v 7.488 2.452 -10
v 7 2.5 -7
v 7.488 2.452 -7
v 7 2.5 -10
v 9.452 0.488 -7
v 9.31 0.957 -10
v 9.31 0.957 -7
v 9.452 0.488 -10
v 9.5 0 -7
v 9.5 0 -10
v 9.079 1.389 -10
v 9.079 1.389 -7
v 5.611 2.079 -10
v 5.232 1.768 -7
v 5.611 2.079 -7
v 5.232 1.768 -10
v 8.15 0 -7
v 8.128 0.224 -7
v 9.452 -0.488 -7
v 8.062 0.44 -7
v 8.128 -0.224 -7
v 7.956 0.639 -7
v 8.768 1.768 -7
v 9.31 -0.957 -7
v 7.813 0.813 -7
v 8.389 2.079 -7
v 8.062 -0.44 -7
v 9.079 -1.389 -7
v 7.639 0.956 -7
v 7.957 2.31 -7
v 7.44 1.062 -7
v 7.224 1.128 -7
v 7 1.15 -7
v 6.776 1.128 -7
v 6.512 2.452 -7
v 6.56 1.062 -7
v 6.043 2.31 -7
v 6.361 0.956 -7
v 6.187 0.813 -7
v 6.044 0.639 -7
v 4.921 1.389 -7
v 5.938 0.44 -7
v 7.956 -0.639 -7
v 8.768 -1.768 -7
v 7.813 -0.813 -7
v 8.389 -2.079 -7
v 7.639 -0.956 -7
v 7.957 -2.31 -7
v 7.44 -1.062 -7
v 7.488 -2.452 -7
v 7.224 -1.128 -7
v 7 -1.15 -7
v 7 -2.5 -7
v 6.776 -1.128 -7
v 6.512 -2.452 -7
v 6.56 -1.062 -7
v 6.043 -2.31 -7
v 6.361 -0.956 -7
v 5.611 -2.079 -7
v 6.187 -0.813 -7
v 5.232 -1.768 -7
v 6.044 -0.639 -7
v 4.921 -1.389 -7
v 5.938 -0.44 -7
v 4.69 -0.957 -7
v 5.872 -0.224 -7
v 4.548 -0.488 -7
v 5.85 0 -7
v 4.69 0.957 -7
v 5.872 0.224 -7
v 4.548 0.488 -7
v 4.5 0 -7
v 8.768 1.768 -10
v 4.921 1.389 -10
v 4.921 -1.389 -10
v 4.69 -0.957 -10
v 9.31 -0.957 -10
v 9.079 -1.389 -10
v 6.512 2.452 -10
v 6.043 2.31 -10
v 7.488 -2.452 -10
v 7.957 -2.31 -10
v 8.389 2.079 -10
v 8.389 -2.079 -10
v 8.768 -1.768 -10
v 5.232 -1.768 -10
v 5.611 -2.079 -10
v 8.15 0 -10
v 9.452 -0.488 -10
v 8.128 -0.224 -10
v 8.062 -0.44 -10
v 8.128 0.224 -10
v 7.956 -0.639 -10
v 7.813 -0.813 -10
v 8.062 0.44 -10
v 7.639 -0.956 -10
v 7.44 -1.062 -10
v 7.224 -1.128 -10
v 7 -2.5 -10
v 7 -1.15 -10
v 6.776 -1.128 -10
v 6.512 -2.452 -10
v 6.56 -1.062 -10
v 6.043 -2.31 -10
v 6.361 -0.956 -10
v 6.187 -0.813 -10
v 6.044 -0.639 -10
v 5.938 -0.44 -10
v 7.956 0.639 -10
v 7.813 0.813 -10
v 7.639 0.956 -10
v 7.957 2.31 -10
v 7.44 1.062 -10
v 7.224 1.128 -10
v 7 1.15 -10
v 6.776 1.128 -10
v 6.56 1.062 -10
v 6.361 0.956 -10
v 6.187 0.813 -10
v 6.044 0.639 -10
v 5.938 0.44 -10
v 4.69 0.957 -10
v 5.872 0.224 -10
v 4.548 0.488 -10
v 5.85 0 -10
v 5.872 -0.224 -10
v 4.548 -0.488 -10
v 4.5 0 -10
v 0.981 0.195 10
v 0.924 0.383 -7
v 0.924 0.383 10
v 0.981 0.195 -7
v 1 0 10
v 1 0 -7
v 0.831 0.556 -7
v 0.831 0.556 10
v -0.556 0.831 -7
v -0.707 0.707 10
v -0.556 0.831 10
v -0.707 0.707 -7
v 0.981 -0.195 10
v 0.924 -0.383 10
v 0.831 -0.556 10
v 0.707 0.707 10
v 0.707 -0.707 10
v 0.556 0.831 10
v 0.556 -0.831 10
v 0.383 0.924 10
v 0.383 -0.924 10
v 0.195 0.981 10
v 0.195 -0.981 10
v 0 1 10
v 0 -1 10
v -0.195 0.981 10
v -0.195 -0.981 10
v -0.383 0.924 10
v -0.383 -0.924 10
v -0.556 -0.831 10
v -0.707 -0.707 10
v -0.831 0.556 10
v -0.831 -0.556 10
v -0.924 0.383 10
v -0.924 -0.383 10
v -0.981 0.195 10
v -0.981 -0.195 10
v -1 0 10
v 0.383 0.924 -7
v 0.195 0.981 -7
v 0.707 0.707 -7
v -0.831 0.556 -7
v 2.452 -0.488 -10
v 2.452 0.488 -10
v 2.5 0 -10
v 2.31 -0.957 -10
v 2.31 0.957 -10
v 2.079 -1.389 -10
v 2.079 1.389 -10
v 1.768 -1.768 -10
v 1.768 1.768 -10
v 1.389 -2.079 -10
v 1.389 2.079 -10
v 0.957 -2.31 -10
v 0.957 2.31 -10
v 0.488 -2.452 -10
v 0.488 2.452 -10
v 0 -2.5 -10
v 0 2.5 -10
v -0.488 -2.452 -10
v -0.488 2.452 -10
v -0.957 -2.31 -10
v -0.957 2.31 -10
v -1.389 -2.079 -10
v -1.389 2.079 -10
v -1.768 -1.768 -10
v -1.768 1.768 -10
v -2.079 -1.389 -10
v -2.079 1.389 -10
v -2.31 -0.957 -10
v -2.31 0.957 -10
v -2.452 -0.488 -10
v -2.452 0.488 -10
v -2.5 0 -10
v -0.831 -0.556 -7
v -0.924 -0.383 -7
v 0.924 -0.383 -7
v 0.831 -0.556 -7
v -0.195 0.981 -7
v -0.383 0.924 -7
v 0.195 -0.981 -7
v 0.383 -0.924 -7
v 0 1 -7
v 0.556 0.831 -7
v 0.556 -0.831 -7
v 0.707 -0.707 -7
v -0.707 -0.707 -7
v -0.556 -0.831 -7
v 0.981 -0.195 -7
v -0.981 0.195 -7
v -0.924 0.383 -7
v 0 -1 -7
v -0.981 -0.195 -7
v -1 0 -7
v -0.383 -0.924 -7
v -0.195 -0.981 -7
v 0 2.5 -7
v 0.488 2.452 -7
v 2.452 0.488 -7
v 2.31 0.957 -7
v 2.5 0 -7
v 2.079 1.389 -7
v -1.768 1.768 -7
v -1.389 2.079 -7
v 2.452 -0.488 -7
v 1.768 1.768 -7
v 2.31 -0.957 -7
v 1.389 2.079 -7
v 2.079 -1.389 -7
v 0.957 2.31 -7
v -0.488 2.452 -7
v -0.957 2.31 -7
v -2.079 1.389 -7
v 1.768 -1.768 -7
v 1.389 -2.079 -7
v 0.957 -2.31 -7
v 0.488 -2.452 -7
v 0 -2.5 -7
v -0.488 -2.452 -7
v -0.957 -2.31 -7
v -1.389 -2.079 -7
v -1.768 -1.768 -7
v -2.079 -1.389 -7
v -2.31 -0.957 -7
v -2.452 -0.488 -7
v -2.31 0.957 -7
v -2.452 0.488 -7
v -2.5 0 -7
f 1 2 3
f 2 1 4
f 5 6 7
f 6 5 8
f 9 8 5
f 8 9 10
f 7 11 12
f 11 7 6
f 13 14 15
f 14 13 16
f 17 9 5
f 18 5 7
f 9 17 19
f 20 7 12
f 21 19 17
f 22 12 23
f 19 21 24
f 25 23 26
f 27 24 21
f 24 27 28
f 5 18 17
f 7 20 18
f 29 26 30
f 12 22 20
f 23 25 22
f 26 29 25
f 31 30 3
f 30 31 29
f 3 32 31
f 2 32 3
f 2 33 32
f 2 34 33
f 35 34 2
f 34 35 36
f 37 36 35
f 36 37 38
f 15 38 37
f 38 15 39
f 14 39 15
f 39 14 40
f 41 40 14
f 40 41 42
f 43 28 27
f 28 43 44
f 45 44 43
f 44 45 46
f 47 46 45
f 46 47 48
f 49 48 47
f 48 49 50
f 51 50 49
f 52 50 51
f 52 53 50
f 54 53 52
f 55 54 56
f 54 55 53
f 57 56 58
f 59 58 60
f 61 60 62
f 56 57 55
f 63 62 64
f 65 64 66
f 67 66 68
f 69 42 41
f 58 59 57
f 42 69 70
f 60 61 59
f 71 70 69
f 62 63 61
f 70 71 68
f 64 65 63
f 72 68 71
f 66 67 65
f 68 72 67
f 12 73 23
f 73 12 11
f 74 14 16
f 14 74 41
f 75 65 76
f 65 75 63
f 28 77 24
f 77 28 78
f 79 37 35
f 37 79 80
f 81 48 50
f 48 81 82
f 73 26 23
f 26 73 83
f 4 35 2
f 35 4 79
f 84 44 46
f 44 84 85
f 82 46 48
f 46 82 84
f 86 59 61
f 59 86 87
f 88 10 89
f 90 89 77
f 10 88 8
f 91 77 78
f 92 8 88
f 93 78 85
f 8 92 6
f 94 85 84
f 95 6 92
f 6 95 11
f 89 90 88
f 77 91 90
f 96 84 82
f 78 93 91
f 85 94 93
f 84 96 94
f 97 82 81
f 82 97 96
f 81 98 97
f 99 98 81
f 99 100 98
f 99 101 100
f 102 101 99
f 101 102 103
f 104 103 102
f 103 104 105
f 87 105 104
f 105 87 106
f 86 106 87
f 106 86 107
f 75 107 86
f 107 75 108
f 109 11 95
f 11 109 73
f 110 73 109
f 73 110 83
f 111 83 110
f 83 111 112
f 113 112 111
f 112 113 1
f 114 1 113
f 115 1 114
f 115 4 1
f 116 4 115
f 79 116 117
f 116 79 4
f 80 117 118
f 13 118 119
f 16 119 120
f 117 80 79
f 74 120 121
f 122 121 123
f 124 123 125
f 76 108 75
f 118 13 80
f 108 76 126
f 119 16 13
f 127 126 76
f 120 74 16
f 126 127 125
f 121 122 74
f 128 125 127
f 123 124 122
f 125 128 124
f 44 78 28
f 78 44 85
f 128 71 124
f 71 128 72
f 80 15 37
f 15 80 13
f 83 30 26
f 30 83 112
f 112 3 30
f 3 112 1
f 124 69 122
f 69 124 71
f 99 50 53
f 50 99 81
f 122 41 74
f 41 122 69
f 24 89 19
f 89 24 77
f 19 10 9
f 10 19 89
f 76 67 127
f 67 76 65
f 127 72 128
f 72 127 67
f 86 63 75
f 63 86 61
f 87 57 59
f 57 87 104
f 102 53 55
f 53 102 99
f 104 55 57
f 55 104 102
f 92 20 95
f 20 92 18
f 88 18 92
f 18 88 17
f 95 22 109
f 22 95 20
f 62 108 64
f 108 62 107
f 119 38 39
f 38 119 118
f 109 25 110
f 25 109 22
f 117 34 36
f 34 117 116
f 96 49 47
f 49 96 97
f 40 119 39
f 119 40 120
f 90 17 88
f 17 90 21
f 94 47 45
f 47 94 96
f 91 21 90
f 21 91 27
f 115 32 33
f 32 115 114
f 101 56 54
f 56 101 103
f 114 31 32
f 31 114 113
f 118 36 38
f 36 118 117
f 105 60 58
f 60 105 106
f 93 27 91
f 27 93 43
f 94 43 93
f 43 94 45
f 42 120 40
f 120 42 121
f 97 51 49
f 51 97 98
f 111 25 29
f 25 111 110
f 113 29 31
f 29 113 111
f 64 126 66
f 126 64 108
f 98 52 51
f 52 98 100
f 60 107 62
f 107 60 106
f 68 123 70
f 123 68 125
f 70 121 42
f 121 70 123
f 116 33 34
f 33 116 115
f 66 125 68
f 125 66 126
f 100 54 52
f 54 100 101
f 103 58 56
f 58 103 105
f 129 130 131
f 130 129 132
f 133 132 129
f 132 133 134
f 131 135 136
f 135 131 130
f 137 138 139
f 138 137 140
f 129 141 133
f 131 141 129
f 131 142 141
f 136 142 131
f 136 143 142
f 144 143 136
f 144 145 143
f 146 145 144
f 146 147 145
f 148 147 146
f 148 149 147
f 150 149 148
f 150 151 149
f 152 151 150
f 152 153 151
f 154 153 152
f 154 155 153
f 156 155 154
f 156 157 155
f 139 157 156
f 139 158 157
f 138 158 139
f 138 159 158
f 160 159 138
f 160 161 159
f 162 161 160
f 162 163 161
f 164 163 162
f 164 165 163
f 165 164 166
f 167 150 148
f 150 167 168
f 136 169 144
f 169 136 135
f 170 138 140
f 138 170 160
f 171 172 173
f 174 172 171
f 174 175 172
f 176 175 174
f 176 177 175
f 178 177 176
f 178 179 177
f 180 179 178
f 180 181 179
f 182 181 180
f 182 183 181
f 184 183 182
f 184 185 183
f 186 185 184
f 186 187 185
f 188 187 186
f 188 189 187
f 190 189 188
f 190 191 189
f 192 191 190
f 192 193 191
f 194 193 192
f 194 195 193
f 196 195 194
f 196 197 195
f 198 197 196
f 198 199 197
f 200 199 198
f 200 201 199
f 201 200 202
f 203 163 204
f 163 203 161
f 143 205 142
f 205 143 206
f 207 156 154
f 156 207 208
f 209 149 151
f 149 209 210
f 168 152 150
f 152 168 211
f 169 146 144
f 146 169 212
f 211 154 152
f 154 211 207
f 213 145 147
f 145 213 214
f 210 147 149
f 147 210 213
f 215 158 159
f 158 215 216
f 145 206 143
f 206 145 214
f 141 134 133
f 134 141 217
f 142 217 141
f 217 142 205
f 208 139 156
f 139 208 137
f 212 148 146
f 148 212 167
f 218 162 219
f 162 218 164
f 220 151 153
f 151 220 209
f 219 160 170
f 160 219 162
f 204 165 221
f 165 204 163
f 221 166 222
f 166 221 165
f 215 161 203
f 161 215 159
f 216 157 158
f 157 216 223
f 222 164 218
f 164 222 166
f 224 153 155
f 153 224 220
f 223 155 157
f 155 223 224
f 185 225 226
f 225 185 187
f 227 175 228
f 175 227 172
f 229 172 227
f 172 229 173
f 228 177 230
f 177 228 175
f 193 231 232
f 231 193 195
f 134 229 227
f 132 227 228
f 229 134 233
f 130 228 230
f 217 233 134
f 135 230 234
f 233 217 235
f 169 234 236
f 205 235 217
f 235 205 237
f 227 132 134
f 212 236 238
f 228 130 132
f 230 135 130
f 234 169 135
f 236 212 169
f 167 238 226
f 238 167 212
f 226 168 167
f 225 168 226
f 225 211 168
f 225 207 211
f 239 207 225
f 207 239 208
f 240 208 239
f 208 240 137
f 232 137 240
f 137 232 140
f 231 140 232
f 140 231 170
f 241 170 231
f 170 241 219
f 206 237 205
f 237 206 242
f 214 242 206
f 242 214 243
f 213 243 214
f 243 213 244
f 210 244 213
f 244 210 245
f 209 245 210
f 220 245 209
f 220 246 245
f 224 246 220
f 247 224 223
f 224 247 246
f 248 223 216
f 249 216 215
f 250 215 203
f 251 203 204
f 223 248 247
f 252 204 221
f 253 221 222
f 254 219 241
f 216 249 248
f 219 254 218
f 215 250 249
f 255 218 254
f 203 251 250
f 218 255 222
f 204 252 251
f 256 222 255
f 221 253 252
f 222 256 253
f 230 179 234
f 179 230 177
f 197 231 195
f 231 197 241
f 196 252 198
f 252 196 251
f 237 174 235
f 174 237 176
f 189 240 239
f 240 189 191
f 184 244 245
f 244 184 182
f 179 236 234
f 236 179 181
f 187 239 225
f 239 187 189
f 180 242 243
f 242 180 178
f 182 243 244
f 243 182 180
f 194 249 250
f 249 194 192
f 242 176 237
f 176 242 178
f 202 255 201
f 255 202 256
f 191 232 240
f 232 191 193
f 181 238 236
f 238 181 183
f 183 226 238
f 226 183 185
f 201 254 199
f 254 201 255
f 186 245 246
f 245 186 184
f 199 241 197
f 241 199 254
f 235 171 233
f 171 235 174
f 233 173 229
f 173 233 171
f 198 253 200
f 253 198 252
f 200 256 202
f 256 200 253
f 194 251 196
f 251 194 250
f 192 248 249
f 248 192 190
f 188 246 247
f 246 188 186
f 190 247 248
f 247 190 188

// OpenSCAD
$fn=32;
cylinder(d=2,h=14+3*2,center=true);
translate([0,0,-8.5])
cylinder(d=5,h=3,center=true);
translate([7,0,0]){
  difference(){

translate([0,0,-8.5])
cylinder(d=5,h=3,center=true);
      translate([0,0,-5])
cylinder(d=2.3,h=14+3*2,center=true);
  }
}
